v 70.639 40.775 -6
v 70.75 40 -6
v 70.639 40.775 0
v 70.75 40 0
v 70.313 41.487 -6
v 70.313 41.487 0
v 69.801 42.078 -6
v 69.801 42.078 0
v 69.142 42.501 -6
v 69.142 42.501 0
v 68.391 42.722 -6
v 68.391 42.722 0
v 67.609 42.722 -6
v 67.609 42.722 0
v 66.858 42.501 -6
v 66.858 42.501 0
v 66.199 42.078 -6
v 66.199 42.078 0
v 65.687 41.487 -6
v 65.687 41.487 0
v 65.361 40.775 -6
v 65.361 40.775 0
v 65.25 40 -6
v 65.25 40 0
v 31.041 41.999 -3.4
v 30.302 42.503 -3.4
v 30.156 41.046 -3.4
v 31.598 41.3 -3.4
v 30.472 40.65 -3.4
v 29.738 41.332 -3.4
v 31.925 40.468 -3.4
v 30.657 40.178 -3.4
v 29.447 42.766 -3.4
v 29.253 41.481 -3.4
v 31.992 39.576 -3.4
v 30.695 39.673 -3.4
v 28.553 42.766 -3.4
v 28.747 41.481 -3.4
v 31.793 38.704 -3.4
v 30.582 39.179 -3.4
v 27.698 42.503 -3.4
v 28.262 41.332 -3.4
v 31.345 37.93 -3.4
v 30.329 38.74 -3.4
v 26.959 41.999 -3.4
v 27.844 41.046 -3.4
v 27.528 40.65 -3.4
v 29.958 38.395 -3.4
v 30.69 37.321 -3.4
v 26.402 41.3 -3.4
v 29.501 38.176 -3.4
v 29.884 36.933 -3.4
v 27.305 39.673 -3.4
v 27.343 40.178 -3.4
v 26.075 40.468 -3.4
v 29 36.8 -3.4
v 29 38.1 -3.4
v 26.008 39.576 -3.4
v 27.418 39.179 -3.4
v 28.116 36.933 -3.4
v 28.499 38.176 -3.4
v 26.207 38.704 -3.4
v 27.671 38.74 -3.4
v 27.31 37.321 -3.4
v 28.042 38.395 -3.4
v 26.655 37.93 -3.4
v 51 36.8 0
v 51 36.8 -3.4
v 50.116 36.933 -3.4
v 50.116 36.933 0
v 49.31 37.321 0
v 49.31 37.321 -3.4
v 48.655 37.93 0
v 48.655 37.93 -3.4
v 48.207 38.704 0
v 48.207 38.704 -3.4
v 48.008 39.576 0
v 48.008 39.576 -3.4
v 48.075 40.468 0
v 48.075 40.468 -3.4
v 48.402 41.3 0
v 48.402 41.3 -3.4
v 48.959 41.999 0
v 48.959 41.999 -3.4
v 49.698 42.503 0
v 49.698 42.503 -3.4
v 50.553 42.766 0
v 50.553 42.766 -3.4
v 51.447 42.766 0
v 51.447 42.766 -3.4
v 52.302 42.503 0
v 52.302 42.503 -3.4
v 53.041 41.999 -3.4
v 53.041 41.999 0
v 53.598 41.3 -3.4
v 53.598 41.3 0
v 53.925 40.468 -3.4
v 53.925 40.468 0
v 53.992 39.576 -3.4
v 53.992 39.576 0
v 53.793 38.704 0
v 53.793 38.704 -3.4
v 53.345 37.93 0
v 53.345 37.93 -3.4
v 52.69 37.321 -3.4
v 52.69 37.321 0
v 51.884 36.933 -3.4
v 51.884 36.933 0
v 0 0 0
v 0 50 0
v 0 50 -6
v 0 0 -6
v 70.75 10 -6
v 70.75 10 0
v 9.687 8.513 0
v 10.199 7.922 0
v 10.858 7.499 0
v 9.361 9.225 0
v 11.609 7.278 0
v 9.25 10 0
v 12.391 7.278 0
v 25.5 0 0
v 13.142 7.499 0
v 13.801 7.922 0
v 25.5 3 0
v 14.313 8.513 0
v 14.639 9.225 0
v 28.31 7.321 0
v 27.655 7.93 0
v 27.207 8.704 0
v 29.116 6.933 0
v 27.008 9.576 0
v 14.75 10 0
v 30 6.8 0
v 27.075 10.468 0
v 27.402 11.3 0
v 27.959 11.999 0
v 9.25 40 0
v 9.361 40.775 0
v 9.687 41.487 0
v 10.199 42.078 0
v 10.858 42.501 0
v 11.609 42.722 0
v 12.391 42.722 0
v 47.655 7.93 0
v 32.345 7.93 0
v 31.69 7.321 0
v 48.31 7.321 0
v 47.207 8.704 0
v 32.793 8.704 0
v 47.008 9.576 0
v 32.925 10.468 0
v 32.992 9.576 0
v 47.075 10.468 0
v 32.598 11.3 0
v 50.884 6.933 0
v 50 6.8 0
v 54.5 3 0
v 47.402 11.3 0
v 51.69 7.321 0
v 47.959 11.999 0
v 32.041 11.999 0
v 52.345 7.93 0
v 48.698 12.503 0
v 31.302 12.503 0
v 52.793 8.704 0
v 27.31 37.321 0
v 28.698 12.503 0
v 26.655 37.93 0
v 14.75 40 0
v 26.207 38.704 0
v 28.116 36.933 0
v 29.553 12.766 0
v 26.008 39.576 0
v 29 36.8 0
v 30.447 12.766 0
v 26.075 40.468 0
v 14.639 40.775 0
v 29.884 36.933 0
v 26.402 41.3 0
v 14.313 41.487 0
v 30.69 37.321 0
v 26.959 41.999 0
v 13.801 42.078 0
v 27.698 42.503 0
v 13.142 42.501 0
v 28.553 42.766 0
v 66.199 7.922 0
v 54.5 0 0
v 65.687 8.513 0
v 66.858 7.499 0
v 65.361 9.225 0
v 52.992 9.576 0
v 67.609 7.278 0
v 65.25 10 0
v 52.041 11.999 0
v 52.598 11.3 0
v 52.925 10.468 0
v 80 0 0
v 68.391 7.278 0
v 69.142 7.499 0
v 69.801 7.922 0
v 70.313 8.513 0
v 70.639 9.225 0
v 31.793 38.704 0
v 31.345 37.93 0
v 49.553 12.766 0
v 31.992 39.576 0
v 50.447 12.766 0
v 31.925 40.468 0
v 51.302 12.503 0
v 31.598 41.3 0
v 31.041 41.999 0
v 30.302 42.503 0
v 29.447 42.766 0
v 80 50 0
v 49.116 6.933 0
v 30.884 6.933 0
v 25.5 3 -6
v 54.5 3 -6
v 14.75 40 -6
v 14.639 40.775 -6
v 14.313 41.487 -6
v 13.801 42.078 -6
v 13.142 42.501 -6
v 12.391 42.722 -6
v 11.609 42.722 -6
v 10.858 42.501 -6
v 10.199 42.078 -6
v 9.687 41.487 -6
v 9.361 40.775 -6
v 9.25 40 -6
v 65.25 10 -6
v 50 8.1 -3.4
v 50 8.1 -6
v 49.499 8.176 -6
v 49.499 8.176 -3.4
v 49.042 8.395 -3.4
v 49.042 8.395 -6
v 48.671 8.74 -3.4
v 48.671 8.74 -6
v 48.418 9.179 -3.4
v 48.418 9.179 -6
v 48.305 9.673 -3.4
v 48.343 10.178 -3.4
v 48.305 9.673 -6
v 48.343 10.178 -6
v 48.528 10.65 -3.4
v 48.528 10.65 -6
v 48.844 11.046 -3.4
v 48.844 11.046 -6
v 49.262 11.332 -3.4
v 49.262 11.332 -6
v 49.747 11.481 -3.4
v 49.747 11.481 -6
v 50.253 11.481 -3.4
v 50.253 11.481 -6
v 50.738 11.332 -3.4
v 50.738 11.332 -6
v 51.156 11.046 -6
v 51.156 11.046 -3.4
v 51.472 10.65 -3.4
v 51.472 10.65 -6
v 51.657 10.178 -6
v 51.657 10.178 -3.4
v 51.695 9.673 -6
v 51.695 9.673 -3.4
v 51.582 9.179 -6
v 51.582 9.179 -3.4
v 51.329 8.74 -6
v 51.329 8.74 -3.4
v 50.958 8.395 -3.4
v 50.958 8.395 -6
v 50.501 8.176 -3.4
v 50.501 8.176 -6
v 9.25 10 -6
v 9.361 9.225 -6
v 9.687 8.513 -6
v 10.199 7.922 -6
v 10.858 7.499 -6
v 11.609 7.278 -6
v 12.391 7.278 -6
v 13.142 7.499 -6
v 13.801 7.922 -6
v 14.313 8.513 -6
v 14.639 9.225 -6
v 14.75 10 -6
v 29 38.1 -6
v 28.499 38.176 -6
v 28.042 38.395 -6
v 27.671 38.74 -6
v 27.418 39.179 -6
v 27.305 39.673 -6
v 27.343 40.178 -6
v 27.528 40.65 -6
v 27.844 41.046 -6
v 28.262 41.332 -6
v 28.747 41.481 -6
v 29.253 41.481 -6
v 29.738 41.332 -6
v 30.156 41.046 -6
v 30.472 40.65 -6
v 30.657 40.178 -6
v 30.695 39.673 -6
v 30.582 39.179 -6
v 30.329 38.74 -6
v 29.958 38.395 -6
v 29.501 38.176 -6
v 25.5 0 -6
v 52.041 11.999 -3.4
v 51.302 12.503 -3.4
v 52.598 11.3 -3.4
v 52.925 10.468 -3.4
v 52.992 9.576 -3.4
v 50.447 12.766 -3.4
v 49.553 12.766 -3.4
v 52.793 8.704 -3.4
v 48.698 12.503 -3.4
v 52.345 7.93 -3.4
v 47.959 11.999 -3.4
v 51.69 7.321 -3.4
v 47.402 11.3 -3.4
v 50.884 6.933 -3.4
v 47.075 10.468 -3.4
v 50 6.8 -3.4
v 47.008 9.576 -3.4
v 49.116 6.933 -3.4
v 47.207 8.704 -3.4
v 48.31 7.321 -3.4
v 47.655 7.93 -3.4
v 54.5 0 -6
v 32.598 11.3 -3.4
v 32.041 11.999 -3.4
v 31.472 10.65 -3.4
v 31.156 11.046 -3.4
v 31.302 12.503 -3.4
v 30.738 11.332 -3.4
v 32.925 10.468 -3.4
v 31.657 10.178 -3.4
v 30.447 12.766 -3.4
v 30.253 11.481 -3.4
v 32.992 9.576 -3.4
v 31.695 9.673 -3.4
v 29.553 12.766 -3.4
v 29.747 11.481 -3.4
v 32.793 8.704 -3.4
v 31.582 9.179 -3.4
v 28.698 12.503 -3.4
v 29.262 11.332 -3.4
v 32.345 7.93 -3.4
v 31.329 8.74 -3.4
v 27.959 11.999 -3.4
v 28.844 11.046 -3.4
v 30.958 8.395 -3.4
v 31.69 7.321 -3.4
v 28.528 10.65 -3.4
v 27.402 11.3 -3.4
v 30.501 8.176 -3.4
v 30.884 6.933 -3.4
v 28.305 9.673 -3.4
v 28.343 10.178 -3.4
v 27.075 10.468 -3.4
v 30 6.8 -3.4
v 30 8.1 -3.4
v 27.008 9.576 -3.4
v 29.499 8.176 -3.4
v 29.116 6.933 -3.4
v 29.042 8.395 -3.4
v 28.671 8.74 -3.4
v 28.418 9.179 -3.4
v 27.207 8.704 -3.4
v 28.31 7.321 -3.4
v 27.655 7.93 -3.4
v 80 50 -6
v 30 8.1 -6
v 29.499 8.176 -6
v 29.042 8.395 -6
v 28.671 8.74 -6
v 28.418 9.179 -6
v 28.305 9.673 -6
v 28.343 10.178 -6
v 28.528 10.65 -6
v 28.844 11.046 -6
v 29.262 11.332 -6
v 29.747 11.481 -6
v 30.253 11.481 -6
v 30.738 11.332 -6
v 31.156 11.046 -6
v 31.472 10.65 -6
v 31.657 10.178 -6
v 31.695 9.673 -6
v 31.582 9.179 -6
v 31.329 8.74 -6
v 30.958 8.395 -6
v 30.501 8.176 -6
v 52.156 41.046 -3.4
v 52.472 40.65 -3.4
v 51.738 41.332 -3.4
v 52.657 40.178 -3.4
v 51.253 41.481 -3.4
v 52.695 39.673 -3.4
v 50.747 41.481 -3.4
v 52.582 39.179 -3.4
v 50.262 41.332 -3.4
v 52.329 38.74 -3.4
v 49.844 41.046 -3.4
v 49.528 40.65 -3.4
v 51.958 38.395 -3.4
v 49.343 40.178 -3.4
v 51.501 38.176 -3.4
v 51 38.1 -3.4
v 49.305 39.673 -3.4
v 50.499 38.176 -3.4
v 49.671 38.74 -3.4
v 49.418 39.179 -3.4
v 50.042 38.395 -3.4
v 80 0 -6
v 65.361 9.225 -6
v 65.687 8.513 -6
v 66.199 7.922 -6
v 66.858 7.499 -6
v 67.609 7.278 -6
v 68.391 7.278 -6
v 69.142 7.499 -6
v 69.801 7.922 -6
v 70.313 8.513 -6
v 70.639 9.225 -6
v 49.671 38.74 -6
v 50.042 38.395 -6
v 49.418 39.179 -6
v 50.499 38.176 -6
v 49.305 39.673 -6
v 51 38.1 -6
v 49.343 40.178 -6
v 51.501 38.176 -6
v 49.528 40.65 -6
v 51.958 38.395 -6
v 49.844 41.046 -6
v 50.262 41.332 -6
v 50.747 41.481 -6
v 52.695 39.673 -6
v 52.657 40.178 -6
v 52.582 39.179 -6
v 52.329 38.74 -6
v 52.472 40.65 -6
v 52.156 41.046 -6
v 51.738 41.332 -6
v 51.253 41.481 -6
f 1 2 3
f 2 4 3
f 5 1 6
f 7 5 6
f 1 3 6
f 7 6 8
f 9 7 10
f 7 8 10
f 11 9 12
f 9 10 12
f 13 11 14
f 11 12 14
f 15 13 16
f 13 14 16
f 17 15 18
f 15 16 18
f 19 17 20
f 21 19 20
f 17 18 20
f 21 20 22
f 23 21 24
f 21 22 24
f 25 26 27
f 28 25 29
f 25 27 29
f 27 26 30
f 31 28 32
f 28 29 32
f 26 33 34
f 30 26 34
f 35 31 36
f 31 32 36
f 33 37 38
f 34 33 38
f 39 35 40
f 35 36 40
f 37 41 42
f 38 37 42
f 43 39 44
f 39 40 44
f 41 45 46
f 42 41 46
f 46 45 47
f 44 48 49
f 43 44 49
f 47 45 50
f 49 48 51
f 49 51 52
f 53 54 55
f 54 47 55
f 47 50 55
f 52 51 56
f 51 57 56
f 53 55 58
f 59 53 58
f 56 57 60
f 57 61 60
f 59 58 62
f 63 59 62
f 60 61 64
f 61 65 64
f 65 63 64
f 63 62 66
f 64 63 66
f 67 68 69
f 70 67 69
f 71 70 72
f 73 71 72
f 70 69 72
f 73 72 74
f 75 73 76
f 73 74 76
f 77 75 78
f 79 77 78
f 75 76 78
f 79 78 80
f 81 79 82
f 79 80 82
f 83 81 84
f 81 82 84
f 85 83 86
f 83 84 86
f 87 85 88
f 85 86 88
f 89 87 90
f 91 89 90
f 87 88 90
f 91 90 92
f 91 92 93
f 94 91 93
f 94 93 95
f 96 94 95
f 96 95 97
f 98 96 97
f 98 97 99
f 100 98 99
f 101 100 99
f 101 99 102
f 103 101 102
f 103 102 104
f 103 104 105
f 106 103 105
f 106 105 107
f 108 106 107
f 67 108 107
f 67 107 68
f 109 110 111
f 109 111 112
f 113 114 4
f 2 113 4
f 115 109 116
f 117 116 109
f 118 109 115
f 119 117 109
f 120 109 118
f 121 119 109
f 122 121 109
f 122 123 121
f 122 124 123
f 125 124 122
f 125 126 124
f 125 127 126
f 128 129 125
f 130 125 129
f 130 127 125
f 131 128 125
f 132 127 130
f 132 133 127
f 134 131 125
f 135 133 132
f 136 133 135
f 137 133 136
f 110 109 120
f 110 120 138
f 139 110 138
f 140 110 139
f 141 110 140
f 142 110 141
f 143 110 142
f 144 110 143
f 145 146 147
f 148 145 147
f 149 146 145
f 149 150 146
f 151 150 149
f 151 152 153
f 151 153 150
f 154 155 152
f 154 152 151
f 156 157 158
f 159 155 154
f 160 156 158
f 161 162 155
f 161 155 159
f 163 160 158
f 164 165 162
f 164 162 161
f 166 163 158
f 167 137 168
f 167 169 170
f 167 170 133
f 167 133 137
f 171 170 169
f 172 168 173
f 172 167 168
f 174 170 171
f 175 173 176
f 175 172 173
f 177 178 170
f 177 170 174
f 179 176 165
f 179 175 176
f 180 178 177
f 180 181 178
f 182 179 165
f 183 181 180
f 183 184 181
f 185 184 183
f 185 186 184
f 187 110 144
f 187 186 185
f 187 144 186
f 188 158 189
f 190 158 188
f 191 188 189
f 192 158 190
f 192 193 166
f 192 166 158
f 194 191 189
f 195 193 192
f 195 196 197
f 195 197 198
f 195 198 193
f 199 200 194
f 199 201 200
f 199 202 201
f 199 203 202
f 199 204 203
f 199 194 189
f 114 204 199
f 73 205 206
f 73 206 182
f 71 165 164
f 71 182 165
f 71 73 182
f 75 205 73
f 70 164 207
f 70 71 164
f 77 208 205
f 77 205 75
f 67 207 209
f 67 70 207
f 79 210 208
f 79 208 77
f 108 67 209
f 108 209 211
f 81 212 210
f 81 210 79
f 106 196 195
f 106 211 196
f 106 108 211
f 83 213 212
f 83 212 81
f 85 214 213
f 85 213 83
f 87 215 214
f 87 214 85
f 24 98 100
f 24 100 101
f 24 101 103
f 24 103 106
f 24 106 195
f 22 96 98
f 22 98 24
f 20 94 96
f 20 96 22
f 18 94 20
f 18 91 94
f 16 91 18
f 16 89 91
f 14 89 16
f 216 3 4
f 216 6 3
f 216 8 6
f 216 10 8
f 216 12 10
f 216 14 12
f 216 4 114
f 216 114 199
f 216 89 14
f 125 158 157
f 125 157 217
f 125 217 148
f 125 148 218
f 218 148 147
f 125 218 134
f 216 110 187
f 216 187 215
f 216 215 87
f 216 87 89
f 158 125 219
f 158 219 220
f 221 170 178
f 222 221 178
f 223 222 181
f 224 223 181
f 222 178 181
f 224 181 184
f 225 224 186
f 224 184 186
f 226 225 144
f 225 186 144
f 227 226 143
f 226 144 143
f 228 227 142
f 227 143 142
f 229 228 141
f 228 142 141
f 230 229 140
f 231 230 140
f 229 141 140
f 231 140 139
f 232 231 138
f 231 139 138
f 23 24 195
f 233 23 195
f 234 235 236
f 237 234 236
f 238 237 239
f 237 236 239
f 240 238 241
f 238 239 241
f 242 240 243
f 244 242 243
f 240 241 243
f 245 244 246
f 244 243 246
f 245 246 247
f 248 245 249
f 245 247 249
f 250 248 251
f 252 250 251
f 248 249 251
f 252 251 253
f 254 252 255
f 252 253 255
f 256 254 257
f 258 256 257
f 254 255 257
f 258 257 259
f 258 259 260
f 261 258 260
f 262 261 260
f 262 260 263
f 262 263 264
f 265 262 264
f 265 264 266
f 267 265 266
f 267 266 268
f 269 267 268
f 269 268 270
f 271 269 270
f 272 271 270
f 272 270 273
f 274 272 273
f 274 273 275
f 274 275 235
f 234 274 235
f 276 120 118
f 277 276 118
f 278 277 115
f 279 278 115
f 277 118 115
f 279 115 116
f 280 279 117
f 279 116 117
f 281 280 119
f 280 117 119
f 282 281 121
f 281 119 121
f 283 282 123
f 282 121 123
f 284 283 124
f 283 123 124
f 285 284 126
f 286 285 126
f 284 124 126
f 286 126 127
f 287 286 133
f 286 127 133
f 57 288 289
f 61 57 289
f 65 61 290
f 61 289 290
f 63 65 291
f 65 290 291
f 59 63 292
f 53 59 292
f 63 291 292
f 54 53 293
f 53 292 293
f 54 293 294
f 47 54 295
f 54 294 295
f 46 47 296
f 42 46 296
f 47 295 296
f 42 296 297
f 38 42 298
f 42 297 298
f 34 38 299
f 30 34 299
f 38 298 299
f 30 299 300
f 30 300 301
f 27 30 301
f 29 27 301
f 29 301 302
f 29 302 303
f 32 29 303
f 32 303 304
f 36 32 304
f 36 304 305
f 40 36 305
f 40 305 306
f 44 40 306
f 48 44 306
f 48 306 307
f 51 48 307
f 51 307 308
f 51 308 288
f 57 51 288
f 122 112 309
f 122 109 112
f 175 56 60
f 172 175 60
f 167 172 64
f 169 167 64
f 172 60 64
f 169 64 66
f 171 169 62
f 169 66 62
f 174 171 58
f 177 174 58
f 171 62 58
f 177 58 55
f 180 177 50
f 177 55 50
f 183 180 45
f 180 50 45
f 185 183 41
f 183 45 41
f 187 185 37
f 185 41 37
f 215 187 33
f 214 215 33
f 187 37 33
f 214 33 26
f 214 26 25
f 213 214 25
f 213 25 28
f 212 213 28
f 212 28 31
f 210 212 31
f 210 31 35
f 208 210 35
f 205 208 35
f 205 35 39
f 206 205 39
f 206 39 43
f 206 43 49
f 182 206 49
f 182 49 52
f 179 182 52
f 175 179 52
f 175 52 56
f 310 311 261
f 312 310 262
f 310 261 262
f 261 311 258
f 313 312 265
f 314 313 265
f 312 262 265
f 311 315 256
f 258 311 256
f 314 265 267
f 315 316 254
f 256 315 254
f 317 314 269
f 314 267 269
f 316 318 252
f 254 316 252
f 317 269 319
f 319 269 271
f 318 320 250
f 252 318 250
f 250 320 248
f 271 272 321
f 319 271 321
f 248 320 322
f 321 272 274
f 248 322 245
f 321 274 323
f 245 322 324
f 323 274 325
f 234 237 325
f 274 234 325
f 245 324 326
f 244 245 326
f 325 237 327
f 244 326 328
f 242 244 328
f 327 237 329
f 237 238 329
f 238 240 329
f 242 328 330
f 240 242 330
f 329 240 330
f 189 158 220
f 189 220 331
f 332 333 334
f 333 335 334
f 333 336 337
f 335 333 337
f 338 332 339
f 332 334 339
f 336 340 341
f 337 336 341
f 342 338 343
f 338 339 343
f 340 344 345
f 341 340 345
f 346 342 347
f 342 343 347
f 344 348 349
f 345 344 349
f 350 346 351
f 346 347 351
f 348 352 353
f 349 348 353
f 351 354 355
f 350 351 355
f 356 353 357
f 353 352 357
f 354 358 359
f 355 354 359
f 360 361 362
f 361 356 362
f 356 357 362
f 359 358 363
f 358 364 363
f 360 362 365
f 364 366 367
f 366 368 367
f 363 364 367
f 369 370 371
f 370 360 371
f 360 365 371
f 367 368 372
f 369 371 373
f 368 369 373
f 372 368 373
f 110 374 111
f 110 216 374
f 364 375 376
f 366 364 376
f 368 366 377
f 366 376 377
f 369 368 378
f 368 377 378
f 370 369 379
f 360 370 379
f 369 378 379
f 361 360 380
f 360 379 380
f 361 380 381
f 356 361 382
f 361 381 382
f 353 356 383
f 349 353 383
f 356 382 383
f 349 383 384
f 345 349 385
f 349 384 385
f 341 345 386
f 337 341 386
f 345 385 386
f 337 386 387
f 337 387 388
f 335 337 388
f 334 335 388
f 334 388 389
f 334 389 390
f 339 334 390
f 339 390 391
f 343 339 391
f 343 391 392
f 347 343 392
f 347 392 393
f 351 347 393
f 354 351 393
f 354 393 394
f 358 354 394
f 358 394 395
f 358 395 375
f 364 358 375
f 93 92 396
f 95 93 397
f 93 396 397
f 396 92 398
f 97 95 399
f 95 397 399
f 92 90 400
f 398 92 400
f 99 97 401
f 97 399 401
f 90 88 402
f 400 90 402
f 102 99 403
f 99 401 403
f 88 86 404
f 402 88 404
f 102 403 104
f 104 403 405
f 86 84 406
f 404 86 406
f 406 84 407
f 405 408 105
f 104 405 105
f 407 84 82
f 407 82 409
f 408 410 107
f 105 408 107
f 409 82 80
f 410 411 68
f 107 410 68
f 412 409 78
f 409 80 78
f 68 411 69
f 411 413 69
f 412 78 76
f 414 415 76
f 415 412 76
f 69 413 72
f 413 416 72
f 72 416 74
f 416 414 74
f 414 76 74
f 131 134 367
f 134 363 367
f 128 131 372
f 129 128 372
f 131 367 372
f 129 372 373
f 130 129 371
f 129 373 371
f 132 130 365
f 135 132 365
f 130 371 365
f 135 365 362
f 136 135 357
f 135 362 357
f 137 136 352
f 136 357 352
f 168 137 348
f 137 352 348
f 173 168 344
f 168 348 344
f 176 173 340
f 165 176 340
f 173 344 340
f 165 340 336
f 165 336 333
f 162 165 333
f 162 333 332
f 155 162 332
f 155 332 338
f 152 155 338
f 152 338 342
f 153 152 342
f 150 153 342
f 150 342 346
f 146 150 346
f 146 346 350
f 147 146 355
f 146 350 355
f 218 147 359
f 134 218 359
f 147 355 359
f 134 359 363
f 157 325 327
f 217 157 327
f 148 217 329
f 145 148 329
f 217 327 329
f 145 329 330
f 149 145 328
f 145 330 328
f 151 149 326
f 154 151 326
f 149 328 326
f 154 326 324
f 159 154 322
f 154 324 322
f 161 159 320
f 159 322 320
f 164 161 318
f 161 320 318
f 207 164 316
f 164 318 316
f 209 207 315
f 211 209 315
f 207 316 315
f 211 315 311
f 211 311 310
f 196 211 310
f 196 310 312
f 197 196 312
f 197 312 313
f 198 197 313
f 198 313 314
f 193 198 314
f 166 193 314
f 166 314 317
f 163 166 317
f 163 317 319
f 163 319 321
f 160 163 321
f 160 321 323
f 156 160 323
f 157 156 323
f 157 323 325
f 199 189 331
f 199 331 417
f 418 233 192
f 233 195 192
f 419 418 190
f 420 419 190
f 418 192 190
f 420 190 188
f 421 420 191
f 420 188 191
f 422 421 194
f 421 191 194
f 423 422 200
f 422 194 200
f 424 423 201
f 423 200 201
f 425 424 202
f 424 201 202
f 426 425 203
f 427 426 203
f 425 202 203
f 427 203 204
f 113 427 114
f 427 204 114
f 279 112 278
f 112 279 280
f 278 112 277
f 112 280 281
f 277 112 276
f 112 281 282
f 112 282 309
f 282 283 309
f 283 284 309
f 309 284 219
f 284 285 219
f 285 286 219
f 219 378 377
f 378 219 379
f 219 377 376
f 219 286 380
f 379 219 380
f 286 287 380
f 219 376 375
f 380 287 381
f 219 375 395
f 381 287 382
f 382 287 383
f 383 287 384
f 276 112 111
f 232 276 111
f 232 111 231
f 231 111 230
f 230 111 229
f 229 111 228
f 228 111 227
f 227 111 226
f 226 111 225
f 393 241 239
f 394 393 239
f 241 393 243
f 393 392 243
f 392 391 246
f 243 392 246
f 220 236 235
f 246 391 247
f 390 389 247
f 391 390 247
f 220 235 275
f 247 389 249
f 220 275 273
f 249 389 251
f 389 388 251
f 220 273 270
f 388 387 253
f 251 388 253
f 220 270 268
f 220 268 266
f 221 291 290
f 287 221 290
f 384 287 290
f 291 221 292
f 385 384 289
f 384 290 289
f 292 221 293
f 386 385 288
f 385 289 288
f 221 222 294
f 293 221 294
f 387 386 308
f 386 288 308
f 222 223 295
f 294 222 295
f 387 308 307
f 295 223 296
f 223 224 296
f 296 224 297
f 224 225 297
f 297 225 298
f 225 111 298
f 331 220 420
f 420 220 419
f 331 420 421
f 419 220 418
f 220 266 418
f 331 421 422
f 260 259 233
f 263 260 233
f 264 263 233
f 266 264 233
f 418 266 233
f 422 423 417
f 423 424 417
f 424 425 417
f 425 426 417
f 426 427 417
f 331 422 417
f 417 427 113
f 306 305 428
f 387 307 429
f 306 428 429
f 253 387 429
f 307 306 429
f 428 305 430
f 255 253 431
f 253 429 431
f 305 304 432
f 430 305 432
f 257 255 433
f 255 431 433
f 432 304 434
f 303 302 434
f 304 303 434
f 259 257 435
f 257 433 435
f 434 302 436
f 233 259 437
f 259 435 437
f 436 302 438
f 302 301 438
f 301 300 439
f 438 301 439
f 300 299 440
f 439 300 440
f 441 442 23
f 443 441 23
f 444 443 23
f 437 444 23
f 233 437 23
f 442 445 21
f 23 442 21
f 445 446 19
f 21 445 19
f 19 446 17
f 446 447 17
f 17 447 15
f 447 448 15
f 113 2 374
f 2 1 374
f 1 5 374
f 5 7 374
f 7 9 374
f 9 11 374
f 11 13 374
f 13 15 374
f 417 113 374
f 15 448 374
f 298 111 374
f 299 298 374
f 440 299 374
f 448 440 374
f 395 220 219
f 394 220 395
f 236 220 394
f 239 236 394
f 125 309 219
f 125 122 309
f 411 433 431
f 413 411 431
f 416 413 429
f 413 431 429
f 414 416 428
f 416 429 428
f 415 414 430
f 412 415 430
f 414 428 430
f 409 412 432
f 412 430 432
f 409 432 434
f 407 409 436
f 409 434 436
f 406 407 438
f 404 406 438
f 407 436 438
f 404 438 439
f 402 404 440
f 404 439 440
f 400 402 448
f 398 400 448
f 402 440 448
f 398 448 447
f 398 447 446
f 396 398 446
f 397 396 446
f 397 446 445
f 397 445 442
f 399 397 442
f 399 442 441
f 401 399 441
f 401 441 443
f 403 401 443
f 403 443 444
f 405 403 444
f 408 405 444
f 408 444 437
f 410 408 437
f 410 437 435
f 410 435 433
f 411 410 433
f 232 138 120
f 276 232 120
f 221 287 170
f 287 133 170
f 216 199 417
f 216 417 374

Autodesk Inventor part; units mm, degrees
ref_plane "YZ Plane" through (0, 0, 0) normal (1, 0, 0) x (0, 1, 0)
ref_plane "XZ Plane" through (0, 0, 0) normal (0, 1, 0) x (-1, 0, 0)
ref_plane "XY Plane" through (0, 0, 0) normal (0, 0, 1) x (1, 0, 0)
sketch "Sketch1" plane through (0, 0, 0) normal (0, 0, 1) x (1, 0, 0)
  line L0 (0, 0) -> (80, 0)
  line L1 (80, 0) -> (80, 50)
  line L2 (80, 50) -> (0, 50)
  line L3 (0, 50) -> (0, 0)
  line L4 (12, 40) -> (12, 10) construction
  line L5 (9.25, 40) -> (9.25, 10)
  line L6 (14.75, 10) -> (14.75, 40)
  arc A0 (14.75, 40) -> (9.25, 40) centre (12, 40) ccw
  arc A1 (9.25, 10) -> (14.75, 10) centre (12, 10) ccw
  line L7 (68, 40) -> (68, 10) construction
  line L8 (65.25, 40) -> (65.25, 10)
  line L9 (70.75, 10) -> (70.75, 40)
  arc A2 (70.75, 40) -> (65.25, 40) centre (68, 40) ccw
  arc A3 (65.25, 10) -> (70.75, 10) centre (68, 10) ccw
  point P0 (12, 25)
  point P1 (68, 25)
  dimension "d0" = 80
  dimension "d1" = 50
  dimension "d2" = 5.5
  dimension "d3" = 12
  dimension "d5" = 30
  dimension "d6" = 12
  dimension "d8" = 5.5
  dimension "d9" = 30
  dimension "d38" = 25
  dimension "d39" = 25
extrude "Extrusion1" add sketch "Sketch1" against normal blind 6
sketch "Sketch2" plane through (0, 0, 0) normal (0, 0, 1) x (1, 0, 0)
  line L0 (0, 0) -> (80, 0) projected
  line L1 (0, 50) -> (0, 0) projected
  line L2 (0, 50) -> (80, 50) projected
  point P0 (30, 9.8)
  point P1 (29, 39.8)
  point P2 (51, 39.8)
  point P3 (50, 9.8)
  dimension "d46" = 29
  dimension "d47" = 22
  dimension "d48" = 30
  dimension "d49" = 20
  dimension "d50" = 30
  dimension "d51" = 30
  dimension "d52" = 10.2
  dimension "d53" = 10.2
hole "Hole1" at (30, 9.8, 0) at (29, 39.8, 0) at (51, 39.8, 0) at (50, 9.8, 0) direction (0, 0, -1) diameter 3.4 end through all counterbore diameter 6 counterbore depth 3.4
sketch "Sketch4" plane through (0, 0, 0) normal (0, 0, 1) x (1, 0, 0)
  line L0 (1, 0) -> (79, 0) projected
  line L1 (54.5, 0) -> (25.5, 0)
  line L2 (25.5, 0) -> (25.5, 3)
  line L3 (25.5, 3) -> (54.5, 3)
  line L4 (54.5, 3) -> (54.5, 0)
  line L5 (80, 1) -> (80, 49) projected
  point P0 (0, 0)
  dimension "d54" = 3
  dimension "d55" = 25.5
  dimension "d56" = 29
extrude "Extrusion2" cut sketch "Sketch4" against normal through all
equation "\"d53\" = d52"
properties part number "MountingAdapter"
